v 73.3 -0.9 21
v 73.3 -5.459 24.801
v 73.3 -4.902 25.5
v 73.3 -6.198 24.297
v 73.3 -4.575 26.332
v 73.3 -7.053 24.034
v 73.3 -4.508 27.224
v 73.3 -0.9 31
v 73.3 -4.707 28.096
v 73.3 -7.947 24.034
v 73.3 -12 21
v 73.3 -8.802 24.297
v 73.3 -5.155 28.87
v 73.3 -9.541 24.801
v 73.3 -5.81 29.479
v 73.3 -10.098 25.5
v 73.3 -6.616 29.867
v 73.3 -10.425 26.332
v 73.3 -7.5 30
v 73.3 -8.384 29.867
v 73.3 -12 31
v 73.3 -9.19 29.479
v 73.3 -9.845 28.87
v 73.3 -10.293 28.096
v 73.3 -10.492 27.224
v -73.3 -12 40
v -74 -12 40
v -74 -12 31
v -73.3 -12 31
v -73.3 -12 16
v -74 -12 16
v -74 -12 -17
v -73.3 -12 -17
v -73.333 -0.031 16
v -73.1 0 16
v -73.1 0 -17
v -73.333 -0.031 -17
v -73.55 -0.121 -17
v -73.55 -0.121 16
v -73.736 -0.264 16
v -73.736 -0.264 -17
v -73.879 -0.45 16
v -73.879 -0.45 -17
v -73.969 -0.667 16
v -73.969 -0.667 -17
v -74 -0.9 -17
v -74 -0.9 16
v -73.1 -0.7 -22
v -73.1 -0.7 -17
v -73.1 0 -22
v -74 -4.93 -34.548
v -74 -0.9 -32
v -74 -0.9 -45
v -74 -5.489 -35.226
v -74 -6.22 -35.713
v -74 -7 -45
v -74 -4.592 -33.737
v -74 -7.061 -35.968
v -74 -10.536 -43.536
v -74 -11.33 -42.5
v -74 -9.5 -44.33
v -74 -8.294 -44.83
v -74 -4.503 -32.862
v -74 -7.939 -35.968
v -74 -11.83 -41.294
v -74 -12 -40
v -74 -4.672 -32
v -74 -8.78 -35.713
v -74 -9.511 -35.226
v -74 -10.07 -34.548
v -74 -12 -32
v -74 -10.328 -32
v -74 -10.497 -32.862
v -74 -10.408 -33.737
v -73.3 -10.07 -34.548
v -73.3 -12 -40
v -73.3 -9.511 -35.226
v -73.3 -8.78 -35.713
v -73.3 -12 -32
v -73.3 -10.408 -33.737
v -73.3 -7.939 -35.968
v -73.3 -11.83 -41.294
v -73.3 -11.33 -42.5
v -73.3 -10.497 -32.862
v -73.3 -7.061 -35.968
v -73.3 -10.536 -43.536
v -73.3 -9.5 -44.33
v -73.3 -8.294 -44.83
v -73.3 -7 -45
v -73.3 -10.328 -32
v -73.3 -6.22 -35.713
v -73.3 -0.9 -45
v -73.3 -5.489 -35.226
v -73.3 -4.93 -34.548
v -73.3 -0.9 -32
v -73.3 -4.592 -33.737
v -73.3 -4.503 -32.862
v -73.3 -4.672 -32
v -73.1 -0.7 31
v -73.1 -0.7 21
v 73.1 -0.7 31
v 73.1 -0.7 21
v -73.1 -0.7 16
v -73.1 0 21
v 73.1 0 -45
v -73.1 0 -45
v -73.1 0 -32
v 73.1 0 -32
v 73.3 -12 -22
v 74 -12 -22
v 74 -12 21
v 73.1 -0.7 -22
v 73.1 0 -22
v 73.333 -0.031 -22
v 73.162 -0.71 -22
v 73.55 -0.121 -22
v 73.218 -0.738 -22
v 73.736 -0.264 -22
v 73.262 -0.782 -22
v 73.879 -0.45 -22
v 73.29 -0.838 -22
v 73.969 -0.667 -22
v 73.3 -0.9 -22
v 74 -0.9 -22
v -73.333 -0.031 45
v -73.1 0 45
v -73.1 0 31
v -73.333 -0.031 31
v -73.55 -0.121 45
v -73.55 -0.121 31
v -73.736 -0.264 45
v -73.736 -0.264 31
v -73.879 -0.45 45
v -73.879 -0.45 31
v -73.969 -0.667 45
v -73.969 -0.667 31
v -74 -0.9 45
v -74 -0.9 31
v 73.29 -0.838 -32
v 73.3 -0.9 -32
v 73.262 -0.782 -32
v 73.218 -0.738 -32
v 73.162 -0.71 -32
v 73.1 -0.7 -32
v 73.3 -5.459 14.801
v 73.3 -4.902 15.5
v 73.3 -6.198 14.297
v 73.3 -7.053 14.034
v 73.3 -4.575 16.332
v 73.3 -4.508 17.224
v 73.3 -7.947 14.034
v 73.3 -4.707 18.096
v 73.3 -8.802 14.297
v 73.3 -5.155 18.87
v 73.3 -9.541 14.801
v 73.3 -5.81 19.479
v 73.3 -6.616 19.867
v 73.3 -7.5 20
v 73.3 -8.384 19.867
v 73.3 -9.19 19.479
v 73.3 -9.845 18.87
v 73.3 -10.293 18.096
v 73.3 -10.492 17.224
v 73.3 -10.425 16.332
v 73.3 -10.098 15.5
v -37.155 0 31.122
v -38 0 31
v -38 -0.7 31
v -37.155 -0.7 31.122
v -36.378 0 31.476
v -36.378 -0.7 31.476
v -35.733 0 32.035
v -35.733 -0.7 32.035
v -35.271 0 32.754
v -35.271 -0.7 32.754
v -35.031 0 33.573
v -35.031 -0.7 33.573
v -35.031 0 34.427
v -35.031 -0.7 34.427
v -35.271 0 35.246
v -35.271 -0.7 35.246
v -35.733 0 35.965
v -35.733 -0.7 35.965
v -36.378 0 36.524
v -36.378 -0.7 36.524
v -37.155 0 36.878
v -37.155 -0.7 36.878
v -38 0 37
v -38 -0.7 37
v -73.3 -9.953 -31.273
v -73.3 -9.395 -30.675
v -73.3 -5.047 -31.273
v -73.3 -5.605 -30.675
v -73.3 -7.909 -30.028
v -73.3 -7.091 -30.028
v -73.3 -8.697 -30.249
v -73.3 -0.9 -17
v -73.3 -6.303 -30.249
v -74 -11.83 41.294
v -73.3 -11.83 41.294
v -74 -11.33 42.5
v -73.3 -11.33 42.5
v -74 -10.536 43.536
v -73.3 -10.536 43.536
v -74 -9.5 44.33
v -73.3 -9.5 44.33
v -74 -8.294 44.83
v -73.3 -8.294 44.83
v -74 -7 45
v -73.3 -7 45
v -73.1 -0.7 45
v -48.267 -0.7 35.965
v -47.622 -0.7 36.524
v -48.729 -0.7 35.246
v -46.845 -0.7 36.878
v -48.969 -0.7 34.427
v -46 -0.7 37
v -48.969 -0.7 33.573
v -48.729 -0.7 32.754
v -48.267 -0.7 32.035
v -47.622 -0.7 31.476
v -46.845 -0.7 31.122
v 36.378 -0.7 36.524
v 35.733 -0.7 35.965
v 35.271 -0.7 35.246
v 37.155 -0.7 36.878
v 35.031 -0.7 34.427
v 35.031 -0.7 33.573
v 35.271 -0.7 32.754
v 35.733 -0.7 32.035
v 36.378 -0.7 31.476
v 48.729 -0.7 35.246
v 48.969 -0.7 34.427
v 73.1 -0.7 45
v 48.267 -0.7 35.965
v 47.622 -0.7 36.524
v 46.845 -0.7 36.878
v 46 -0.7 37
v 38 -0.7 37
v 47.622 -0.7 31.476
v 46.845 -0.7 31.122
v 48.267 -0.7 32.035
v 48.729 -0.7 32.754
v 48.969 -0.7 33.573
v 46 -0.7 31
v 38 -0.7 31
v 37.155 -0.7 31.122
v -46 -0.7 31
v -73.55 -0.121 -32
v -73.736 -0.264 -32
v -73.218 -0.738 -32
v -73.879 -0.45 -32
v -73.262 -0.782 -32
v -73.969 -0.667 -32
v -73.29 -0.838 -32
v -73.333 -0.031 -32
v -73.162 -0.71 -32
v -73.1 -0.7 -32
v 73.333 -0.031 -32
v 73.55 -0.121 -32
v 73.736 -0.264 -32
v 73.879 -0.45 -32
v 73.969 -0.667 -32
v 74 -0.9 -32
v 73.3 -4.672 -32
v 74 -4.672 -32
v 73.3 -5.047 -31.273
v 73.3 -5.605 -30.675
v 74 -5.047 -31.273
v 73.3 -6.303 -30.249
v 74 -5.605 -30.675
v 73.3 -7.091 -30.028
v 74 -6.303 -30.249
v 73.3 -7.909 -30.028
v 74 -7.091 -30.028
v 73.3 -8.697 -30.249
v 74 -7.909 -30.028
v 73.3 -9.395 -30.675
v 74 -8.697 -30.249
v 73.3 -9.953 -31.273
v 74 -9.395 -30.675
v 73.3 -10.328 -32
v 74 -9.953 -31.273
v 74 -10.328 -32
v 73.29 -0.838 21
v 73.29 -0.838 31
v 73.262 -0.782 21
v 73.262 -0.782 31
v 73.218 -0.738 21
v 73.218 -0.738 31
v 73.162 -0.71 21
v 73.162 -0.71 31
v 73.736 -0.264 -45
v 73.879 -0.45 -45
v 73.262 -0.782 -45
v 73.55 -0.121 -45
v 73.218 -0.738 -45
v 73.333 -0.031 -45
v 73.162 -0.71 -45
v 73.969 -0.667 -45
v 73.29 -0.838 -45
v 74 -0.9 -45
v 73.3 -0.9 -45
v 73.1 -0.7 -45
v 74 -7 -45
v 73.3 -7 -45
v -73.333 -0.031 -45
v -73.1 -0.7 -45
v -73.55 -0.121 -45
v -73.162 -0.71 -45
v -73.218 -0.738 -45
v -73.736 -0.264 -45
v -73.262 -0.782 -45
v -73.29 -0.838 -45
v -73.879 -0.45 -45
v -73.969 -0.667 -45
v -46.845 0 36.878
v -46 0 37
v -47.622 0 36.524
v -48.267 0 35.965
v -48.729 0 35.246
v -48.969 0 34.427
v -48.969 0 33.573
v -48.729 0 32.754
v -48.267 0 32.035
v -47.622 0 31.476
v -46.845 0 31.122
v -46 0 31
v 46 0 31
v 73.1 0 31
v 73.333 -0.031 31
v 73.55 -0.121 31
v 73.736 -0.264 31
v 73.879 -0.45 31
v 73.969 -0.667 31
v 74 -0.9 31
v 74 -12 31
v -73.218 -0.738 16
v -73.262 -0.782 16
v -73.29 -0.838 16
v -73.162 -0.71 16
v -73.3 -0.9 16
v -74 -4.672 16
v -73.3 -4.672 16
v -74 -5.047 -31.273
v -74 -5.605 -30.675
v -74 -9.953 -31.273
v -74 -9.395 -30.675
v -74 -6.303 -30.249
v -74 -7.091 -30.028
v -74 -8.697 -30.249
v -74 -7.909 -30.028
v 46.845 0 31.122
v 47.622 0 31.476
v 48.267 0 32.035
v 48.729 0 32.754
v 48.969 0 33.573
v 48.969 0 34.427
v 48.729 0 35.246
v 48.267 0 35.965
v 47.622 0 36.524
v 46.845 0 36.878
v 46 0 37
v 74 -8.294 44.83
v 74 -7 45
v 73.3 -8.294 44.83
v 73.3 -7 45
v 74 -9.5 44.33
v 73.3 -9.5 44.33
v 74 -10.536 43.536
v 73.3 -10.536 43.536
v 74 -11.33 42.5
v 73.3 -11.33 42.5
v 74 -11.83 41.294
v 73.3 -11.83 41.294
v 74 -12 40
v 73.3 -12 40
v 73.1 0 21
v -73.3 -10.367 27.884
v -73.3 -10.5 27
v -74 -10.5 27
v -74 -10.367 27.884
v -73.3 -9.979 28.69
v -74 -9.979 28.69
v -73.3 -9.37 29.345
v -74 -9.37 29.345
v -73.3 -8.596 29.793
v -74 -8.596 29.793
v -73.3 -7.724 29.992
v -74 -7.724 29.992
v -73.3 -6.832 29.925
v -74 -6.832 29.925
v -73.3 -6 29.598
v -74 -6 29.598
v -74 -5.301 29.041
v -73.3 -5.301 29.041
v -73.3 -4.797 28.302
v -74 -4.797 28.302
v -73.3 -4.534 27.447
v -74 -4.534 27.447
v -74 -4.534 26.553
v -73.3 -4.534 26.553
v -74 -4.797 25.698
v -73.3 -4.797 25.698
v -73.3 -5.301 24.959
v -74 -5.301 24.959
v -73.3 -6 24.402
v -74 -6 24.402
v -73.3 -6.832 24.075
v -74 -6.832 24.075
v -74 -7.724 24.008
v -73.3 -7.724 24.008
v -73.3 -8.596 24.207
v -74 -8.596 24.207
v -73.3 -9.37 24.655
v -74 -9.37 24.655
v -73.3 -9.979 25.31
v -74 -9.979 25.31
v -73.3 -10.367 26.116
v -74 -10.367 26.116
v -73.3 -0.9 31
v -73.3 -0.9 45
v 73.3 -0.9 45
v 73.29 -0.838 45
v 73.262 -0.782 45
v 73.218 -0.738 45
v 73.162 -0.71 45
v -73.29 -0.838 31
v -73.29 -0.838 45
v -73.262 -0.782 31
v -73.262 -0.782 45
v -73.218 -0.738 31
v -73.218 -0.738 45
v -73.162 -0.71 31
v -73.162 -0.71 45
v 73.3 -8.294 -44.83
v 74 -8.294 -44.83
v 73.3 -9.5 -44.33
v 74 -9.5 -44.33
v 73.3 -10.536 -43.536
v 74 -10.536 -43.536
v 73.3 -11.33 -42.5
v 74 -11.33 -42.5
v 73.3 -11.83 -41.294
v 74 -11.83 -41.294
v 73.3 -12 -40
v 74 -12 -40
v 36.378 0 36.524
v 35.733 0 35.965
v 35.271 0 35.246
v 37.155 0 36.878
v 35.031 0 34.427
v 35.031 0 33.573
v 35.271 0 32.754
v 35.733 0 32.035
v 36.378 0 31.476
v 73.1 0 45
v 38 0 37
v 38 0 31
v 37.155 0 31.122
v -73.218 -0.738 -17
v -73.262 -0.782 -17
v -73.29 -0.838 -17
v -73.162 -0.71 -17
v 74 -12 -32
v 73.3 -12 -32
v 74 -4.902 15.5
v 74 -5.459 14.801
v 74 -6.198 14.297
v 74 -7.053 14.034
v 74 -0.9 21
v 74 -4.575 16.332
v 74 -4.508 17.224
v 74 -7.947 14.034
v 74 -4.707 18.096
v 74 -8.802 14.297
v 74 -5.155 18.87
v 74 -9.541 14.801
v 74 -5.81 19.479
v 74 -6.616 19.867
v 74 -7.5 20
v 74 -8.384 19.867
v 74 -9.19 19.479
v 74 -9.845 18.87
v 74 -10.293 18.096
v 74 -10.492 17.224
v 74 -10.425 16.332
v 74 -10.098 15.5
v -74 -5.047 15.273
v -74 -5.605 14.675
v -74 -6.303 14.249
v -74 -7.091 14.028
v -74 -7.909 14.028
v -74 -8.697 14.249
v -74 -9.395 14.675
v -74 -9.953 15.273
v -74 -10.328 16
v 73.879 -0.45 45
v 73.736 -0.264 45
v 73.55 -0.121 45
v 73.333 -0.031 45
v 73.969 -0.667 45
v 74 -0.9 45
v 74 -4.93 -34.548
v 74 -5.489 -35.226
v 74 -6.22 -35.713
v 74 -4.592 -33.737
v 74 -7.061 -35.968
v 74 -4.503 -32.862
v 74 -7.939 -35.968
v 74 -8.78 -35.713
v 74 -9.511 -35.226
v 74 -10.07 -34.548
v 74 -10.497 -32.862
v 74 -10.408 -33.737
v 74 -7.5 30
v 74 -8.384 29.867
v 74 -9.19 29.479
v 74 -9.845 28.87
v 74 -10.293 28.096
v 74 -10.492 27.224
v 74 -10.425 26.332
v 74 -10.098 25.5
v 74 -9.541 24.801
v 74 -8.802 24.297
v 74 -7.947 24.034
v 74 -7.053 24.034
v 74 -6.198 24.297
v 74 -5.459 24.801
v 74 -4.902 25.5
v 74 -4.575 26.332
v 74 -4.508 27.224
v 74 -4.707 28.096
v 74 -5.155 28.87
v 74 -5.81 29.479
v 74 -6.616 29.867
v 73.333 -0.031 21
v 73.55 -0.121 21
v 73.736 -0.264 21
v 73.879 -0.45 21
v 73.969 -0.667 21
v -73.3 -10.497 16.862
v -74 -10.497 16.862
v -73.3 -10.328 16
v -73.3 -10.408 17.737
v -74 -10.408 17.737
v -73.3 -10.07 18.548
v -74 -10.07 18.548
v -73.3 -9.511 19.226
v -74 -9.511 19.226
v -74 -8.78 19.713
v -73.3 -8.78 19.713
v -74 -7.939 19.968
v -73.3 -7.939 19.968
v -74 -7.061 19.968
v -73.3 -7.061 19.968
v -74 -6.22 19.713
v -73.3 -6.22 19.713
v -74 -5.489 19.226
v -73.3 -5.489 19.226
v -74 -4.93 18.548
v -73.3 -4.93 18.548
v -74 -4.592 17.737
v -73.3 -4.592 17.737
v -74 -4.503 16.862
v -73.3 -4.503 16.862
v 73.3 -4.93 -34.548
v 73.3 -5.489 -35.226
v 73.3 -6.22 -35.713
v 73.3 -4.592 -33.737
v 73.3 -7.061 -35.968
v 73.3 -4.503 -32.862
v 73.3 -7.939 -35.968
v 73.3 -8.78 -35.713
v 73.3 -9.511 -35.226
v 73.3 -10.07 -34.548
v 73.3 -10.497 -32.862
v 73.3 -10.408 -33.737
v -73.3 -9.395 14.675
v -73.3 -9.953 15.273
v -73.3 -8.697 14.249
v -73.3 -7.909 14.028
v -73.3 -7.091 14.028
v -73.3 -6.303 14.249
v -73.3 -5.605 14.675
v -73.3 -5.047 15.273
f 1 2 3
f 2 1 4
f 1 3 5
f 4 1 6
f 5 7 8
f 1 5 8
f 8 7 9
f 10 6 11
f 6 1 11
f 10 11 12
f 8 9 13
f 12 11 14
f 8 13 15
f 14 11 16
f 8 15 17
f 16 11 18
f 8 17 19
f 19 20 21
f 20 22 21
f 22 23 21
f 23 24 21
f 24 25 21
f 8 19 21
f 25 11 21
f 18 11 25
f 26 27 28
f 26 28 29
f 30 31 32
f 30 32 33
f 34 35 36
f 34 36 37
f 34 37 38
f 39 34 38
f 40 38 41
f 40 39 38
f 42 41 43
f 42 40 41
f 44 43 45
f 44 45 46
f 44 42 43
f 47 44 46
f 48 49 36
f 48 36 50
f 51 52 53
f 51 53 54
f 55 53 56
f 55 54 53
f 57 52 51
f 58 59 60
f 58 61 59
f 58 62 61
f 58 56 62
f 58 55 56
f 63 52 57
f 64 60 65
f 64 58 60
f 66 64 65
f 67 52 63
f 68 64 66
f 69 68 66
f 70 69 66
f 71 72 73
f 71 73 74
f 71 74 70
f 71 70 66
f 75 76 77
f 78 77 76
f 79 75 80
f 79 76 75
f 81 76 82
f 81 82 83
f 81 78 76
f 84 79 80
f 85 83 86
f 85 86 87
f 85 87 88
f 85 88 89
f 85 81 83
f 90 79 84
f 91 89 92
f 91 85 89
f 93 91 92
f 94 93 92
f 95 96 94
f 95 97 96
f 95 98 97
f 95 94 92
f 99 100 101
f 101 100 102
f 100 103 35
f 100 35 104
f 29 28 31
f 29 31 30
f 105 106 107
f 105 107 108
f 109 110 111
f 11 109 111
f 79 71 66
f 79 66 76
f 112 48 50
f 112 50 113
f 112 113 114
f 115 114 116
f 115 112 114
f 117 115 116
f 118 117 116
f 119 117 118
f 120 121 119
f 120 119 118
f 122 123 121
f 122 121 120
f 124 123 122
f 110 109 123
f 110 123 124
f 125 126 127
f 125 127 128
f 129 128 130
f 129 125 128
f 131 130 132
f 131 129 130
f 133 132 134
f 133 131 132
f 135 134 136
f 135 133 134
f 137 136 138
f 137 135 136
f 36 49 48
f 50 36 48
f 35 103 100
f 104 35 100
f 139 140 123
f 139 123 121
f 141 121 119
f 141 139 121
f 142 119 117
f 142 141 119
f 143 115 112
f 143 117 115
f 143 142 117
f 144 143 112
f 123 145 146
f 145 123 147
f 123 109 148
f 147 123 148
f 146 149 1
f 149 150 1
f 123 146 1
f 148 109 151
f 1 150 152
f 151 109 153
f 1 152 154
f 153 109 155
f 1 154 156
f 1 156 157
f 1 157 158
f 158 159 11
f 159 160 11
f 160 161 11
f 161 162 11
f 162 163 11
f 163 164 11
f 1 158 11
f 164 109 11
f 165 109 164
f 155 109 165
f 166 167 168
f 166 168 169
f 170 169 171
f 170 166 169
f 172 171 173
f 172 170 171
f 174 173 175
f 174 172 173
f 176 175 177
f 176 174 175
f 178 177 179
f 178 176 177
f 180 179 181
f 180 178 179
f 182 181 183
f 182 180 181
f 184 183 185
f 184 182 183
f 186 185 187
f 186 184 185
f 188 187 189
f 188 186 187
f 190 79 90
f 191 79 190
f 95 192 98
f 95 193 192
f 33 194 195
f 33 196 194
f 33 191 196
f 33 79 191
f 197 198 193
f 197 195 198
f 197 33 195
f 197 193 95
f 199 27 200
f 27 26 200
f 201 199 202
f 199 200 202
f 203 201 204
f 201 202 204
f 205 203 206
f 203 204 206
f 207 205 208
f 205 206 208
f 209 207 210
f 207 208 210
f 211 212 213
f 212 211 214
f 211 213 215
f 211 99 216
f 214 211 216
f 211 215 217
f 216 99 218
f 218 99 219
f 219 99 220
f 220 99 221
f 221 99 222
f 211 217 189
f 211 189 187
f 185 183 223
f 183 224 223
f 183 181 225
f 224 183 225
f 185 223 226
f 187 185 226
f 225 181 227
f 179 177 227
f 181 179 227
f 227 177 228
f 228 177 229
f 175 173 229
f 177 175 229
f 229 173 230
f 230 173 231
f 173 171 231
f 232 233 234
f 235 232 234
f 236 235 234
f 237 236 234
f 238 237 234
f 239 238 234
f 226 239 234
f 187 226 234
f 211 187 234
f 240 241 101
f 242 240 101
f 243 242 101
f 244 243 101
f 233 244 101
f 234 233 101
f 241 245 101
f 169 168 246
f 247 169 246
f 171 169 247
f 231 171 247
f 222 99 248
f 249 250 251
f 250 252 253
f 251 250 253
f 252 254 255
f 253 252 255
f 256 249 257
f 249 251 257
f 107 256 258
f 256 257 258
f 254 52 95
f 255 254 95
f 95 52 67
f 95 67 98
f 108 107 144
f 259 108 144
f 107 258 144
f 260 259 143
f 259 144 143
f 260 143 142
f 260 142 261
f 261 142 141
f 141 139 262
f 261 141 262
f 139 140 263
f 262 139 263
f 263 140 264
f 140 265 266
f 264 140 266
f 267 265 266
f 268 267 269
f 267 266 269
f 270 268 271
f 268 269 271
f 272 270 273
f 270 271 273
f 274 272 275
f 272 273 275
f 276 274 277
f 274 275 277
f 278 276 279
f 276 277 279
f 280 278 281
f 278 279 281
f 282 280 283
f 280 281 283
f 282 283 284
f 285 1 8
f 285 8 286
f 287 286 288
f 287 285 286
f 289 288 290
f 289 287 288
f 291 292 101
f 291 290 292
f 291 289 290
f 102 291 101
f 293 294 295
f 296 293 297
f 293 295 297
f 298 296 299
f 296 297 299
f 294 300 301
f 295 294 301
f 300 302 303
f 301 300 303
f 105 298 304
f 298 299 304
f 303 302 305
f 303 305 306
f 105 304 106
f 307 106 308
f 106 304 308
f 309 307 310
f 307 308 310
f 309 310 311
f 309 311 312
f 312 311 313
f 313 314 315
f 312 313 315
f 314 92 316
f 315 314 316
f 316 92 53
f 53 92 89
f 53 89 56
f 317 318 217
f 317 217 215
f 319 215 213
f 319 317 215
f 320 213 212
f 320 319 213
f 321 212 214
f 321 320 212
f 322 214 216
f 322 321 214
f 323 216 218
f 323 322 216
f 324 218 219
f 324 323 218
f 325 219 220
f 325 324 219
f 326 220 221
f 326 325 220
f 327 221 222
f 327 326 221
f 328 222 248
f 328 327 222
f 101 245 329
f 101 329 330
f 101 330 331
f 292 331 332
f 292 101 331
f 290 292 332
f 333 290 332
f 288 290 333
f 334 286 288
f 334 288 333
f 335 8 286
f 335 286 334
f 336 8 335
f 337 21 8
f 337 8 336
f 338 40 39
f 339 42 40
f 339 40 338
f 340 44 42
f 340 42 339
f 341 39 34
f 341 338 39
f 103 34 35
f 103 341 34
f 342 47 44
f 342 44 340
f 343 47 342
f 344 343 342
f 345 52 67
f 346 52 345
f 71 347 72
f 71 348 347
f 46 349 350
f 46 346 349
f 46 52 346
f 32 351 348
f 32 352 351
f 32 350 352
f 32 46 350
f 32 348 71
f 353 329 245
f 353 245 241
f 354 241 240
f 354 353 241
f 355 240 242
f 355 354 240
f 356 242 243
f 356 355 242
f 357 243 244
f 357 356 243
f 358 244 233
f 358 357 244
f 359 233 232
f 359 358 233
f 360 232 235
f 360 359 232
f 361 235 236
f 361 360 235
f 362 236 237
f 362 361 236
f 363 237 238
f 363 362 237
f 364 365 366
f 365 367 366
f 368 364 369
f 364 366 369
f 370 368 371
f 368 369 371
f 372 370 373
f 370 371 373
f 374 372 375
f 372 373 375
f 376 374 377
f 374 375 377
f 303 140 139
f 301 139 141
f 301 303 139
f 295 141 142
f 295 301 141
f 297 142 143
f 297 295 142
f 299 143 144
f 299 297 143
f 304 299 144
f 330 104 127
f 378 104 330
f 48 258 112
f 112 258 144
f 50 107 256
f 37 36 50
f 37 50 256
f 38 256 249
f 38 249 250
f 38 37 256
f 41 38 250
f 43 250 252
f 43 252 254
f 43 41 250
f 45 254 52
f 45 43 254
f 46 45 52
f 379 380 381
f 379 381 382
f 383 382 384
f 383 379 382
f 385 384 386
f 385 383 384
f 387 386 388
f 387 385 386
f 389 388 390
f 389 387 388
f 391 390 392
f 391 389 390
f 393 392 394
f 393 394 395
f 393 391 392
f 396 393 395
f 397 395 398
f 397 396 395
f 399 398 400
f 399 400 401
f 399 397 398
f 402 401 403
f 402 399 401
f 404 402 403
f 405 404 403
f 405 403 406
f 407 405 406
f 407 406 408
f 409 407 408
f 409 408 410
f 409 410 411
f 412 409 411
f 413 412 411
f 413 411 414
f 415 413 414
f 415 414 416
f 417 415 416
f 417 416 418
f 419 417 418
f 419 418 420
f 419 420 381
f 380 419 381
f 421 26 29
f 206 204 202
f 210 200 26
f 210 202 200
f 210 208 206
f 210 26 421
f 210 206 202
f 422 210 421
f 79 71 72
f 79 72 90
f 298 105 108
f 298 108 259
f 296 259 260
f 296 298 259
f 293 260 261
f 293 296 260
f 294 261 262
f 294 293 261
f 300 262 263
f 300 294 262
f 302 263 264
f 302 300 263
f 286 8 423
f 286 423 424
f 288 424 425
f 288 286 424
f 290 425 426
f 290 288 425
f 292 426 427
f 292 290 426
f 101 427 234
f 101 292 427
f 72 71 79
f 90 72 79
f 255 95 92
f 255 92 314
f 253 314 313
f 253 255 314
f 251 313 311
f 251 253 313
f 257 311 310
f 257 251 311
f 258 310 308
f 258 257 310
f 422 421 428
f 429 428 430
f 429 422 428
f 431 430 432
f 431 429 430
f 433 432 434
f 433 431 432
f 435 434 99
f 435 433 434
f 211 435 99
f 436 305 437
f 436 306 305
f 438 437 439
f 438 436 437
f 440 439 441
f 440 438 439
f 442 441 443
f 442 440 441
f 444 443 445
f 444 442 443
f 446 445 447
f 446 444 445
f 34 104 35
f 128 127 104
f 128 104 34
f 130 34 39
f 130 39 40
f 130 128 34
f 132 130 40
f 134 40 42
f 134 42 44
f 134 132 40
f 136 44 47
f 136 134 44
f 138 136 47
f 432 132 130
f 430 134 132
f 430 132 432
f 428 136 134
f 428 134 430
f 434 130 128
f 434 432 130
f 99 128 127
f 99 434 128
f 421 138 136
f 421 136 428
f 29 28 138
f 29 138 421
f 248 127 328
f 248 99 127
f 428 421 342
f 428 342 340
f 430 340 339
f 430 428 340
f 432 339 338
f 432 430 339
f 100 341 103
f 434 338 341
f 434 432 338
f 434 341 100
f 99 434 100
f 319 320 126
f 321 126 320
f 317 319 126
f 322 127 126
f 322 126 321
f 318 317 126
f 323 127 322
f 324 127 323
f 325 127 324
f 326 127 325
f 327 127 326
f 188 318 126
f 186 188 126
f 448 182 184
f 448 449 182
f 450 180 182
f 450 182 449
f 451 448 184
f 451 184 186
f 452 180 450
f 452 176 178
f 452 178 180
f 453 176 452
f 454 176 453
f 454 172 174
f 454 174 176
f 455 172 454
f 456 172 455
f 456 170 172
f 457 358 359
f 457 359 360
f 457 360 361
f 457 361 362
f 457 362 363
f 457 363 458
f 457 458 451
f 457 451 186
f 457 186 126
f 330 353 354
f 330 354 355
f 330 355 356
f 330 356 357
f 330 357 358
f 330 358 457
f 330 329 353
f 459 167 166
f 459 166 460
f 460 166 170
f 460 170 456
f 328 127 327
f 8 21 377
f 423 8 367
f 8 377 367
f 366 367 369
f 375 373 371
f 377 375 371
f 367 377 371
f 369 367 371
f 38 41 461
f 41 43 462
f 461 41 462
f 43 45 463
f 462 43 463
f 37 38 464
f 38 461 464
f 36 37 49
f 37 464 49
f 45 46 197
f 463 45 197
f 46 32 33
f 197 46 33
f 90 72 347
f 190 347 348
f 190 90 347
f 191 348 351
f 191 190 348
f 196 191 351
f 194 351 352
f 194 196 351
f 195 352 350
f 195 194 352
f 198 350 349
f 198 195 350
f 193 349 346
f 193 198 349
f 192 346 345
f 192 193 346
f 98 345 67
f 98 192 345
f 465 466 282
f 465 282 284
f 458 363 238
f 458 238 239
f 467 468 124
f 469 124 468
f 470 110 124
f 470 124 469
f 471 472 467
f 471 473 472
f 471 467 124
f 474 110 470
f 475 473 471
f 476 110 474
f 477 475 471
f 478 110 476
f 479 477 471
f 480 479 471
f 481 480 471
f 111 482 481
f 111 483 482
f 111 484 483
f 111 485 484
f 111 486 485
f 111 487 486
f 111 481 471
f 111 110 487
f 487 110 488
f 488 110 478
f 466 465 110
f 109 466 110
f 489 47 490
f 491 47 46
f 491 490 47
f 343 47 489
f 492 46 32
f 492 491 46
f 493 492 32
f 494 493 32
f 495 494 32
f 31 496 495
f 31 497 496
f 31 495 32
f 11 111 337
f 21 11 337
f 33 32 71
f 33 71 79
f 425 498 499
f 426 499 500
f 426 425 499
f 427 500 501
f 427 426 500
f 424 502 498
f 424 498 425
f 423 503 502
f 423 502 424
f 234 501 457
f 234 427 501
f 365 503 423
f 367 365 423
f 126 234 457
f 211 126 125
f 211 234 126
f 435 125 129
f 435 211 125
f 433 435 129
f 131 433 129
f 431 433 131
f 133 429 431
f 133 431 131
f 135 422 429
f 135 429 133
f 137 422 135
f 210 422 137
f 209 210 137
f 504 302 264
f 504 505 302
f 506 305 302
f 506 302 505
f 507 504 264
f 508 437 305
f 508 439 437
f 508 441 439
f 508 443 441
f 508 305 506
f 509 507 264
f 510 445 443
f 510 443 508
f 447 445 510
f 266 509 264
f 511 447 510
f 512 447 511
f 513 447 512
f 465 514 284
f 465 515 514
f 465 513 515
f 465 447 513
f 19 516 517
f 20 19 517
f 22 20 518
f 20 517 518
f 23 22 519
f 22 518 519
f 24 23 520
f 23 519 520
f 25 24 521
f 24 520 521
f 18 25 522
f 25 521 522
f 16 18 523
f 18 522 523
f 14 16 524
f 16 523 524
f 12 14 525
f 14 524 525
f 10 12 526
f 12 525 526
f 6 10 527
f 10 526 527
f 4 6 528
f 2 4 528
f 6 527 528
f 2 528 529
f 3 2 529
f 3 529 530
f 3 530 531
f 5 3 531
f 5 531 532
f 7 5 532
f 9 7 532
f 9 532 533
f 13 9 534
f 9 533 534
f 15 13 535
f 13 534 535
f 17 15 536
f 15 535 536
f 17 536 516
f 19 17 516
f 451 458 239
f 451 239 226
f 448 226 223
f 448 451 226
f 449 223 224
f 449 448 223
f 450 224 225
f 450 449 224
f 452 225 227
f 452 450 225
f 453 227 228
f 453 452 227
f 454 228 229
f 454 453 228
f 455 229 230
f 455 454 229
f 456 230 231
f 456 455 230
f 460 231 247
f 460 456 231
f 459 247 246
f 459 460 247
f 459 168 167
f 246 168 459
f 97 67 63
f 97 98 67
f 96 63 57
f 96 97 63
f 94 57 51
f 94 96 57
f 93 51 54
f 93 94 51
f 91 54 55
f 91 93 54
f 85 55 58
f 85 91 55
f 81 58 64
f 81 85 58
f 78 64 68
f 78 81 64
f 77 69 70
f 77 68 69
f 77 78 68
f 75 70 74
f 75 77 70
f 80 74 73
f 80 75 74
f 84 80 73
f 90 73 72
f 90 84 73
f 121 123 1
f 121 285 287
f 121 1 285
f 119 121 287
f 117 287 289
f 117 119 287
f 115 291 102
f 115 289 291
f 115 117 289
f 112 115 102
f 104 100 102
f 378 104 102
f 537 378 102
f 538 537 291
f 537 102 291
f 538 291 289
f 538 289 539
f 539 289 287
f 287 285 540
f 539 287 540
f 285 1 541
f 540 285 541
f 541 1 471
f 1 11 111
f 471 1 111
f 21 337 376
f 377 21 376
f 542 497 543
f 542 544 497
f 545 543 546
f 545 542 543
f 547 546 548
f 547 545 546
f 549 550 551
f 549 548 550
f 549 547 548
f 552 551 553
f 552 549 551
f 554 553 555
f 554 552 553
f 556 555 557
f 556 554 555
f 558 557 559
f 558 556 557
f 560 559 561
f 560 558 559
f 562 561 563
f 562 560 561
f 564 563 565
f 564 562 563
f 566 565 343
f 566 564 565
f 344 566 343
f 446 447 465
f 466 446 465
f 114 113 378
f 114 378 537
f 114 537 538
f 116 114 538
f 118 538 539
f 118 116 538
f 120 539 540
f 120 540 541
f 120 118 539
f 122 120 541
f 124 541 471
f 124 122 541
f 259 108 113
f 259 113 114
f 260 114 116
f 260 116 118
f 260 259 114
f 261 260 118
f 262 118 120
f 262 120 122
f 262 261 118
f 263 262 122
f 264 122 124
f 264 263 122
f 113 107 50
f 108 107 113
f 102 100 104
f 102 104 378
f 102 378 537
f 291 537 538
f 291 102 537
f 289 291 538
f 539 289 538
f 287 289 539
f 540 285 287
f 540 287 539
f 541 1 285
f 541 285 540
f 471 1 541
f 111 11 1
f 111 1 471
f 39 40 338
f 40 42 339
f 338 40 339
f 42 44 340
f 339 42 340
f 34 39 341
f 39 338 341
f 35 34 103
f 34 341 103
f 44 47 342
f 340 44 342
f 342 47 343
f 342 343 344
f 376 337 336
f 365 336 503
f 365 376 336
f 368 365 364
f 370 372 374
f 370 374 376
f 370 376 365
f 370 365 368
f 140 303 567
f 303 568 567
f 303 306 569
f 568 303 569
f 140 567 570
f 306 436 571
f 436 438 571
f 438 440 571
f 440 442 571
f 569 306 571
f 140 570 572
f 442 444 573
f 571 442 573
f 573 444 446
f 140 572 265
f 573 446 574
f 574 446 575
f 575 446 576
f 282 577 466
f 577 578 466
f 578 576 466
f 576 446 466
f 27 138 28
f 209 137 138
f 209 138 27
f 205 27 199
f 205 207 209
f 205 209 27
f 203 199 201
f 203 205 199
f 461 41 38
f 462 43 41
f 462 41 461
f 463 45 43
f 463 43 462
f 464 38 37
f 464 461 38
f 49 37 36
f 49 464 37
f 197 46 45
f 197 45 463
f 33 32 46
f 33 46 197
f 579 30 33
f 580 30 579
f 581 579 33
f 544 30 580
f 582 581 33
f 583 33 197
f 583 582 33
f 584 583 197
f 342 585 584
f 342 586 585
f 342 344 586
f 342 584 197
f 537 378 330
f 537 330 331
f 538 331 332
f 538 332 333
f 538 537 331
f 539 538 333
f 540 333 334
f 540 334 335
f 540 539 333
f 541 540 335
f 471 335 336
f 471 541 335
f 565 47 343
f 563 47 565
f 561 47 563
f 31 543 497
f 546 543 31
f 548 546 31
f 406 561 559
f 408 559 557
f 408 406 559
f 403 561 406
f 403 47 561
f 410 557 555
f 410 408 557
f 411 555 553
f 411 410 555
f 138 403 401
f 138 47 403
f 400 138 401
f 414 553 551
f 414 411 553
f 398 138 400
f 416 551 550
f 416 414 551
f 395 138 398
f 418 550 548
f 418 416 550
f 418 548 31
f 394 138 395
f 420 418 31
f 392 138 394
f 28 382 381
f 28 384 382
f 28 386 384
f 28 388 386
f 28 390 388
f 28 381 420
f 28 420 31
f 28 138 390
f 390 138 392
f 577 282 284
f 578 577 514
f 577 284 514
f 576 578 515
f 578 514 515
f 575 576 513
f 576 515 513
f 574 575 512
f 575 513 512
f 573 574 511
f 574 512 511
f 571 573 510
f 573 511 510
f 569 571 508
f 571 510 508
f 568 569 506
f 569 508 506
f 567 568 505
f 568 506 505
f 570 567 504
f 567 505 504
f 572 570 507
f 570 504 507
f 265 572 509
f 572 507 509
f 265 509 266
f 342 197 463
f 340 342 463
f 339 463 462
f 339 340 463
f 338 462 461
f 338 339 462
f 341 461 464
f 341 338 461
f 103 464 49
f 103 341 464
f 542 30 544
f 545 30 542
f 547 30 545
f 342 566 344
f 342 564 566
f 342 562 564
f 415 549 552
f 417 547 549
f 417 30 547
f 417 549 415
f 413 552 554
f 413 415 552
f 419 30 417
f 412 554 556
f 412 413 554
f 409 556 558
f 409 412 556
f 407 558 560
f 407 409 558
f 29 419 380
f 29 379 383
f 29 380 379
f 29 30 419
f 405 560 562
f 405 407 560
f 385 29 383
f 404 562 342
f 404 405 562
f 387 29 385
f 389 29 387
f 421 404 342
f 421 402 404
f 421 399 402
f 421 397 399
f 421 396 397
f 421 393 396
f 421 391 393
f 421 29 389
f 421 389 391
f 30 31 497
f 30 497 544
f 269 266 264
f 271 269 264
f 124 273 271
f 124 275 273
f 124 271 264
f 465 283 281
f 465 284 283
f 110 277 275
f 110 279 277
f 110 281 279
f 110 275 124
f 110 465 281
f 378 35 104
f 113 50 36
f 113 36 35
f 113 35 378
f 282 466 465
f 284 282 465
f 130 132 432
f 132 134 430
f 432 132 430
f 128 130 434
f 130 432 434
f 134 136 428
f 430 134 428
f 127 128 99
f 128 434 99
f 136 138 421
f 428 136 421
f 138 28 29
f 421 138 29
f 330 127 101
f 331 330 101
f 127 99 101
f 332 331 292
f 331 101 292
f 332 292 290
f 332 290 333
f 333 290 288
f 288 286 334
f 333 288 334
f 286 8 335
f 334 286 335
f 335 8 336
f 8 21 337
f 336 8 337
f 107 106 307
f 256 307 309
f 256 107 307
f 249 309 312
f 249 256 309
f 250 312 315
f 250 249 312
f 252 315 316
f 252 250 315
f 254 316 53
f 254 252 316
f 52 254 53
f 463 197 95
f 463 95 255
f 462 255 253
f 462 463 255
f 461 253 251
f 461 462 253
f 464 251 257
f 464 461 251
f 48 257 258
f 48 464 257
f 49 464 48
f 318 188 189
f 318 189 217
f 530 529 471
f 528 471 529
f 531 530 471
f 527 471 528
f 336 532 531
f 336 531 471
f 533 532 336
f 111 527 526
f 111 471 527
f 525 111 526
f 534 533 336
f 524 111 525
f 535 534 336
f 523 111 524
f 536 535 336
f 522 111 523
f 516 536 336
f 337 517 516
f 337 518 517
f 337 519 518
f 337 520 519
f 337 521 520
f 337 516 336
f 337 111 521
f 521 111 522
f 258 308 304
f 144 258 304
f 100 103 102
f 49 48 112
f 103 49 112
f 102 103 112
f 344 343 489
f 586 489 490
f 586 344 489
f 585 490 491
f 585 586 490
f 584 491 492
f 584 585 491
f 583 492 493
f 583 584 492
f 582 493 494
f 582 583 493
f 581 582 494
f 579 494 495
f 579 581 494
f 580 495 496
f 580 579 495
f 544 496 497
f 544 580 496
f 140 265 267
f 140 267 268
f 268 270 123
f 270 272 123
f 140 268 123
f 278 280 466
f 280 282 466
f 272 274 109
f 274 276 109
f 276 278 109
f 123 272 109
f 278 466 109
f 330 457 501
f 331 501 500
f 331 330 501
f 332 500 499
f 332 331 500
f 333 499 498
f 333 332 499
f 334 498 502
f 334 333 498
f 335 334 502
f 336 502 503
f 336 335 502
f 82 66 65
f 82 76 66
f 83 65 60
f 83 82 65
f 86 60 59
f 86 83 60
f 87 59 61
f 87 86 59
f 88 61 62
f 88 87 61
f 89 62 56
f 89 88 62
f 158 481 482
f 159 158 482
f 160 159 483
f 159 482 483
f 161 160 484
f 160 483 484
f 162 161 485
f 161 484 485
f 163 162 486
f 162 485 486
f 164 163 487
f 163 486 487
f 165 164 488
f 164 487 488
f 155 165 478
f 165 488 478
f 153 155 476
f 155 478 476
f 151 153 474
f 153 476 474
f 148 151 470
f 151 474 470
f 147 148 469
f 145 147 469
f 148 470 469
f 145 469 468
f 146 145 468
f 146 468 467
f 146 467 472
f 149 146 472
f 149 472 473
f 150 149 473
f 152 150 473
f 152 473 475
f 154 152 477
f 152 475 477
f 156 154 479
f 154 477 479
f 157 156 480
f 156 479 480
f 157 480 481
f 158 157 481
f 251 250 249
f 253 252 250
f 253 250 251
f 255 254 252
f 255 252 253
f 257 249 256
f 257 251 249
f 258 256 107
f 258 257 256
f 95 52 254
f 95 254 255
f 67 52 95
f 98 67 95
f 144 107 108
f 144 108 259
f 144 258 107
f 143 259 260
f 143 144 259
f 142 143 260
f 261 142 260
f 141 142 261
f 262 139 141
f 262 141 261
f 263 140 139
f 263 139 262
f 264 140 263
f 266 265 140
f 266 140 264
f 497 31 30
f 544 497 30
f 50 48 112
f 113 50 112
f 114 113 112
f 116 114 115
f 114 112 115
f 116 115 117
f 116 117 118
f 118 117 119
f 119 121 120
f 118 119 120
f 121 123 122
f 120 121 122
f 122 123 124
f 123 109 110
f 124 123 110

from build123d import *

# Parameters (mm, degrees)
SKETCH_1_W                         = 148
SKETCH_1_H                         = 90
SM_BASE_FLANGE_1_DEPTH             = 0.7
SM_EDGE_FLANGE_1_STRIP_W           = 3.2
SM_EDGE_FLANGE_1_STRIP_H           = 0.7
SM_EDGE_FLANGE_1_STRIP_CUT_DEPTH   = 90
SM_EDGE_FLANGE_1_STRIP_2_W         = 3.2
SM_EDGE_FLANGE_1_STRIP_2_H         = 0.7
SM_EDGE_FLANGE_1_STRIP_CUT_2_DEPTH = 90
SM_EDGE_FLANGE_1_DEPTH             = 90
SM_EDGE_FLANGE_1_PROFILE_W         = 90
SM_EDGE_FLANGE_1_PROFILE_H         = 11.1
SM_EDGE_FLANGE_1_PROFILE_R         = 3
SM_EDGE_FLANGE_1_FLAT_DEPTH        = 0.7
SM_EDGE_FLANGE_1_BEND_DEPTH        = 90
FILLET_2_R                         = 5
CUT_EXTRUDE_START                  = -10
SKETCH_15_R                        = 3
CUT_EXTRUDE_1_DEPTH                = 10
SPLIT_BODIES_1_SURFACE_1_1_BACK    = 174.632
SPLIT_BODIES_1_SURFACE_1_1_DEPTH   = 349.264
SPLIT_BODIES_1_SURFACE_1_2_BACK    = 174.632
SPLIT_BODIES_1_SURFACE_1_2_DEPTH   = 349.264
SPLIT_BODIES_1_SURFACE_2_3_BACK    = 174.632
SPLIT_BODIES_1_SURFACE_2_3_DEPTH   = 349.264
SPLIT_BODIES_1_SURFACE_2_4_BACK    = 174.632
SPLIT_BODIES_1_SURFACE_2_4_DEPTH   = 349.264
SPLIT_BODIES_1_SURFACE_3_5_BACK    = 174.632
SPLIT_BODIES_1_SURFACE_3_5_DEPTH   = 349.264
SPLIT_BODIES_1_SURFACE_3_6_BACK    = 174.632
SPLIT_BODIES_1_SURFACE_3_6_DEPTH   = 349.264
SPLIT_BODIES_1_SURFACE_4_7_BACK    = 174.632
SPLIT_BODIES_1_SURFACE_4_7_DEPTH   = 349.264
SPLIT_BODIES_1_SURFACE_4_8_BACK    = 174.632
SPLIT_BODIES_1_SURFACE_4_8_DEPTH   = 349.264


# Sheet-metal steps are written as plain solids
with BuildPart() as part:
    # Sketch 1 → 基体-法兰1 (new body)
    with BuildSketch(Plane(origin=(0, 0, 0), x_dir=(1, 0, 0), z_dir=(0, 1, 0))):
        Rectangle(SKETCH_1_W, SKETCH_1_H)
        with BuildLine():
            Line((-46, -31), (-38, -31))
            ThreePointArc((-38, -31), (-35, -34), (-38, -37))
            Line((-38, -37), (-46, -37))
            ThreePointArc((-46, -37), (-49, -34), (-46, -31))
        make_face(mode=Mode.SUBTRACT)
        with BuildLine():
            Line((38, -31), (46, -31))
            ThreePointArc((46, -31), (49, -34), (46, -37))
            Line((46, -37), (38, -37))
            ThreePointArc((38, -37), (35, -34), (38, -31))
        make_face(mode=Mode.SUBTRACT)
    extrude(amount=-SM_BASE_FLANGE_1_DEPTH)

    # 边线-法兰1 strip (across the edge) → 边线-法兰1 strip cut (cut)
    with BuildSketch(Plane(origin=(74, -0.7, -45), x_dir=(-1, 0, 0), z_dir=(0, 0, 1))):
        with Locations((-0.7, -0.35)):
            Rectangle(SM_EDGE_FLANGE_1_STRIP_W, SM_EDGE_FLANGE_1_STRIP_H)
    extrude(amount=SM_EDGE_FLANGE_1_STRIP_CUT_DEPTH, mode=Mode.SUBTRACT)

    # 边线-法兰1 strip 2 (across the edge) → 边线-法兰1 strip cut 2 (cut)
    with BuildSketch(Plane(origin=(-74, -0.7, 45), x_dir=(1, 0, 0), z_dir=(0, 0, -1))):
        with Locations((-0.7, -0.35)):
            Rectangle(SM_EDGE_FLANGE_1_STRIP_2_W, SM_EDGE_FLANGE_1_STRIP_2_H)
    extrude(amount=SM_EDGE_FLANGE_1_STRIP_CUT_2_DEPTH, mode=Mode.SUBTRACT)

    # 边线-法兰1 bend section (across the edge) → 边线-法兰1 (add)
    with BuildSketch(Plane(origin=(74, -0.7, -45), x_dir=(-1, 0, 0), z_dir=(0, 0, 1))):
        with BuildLine():
            Line((0, 0.2), (0.7, 0.2))
            ThreePointArc((0.7, 0.2), (0.758578644, 0.058578644), (0.9, 0))
            Line((0.9, 0), (0.9, -0.7))
            ThreePointArc((0.9, -0.7), (0.263603897, -0.436396103), (0, 0.2))
        make_face()
    extrude(amount=SM_EDGE_FLANGE_1_DEPTH)

    # 边线-法兰1 profile (on flange) → 边线-法兰1 flat (add)
    with BuildSketch(Plane(origin=(74, -0.7, 0), x_dir=(0, 0, 1), z_dir=(1, 0, 0))):
        with Locations((0, 5.75)):
            Rectangle(SM_EDGE_FLANGE_1_PROFILE_W, SM_EDGE_FLANGE_1_PROFILE_H)
        with Locations((17, 6.8)):
            Circle(SM_EDGE_FLANGE_1_PROFILE_R, mode=Mode.SUBTRACT)
        with Locations((27, 6.8)):
            Circle(SM_EDGE_FLANGE_1_PROFILE_R, mode=Mode.SUBTRACT)
        with Locations((-33, 6.8)):
            Circle(SM_EDGE_FLANGE_1_PROFILE_R, mode=Mode.SUBTRACT)
    extrude(amount=-SM_EDGE_FLANGE_1_FLAT_DEPTH)

    # 边线-法兰1 section (across the edge) → 边线-法兰1 bend (add)
    with BuildSketch(Plane(origin=(-74, -0.7, 45), x_dir=(1, 0, 0), z_dir=(0, 0, -1))):
        with BuildLine():
            Line((0, 0.2), (0, 11.3))
            Line((0, 11.3), (0.7, 11.3))
            Line((0.7, 11.3), (0.7, 0.2))
            ThreePointArc((0.7, 0.2), (0.758578644, 0.058578644), (0.9, 0))
            Line((0.9, 0), (0.9, -0.7))
            ThreePointArc((0.9, -0.7), (0.263603897, -0.436396103), (0, 0.2))
        make_face()
    extrude(amount=SM_EDGE_FLANGE_1_BEND_DEPTH)

    # 圆角2
    fillet_2_edges = [part.edges().sort_by_distance(p)[0] for p in [
        (-73.65, -12, 45),
        (-73.65, -12, -45),
        (73.65, -12, -45),
        (73.65, -12, 45),
    ]]
    fillet(fillet_2_edges, radius=FILLET_2_R)

    # 草图15 → 切除-拉伸1 (cut)
    with BuildSketch(Plane.ZY.offset(74).offset(CUT_EXTRUDE_START)):
        with Locations(Location((-33, -7.5, 0), (0, 0, 270))):
            Circle(SKETCH_15_R)
        with Locations(Location((17, -7.5, 0), (0, 0, 270))):
            Circle(SKETCH_15_R)
        with Locations(Location((27, -7.5, 0), (0, 0, 270))):
            Circle(SKETCH_15_R)
    extrude(amount=CUT_EXTRUDE_1_DEPTH, mode=Mode.SUBTRACT)


with BuildPart() as body_2:
    # Split Bodies 1: the piece behind the surface
    add(part.part)
    # Split Bodies 1 surface 1: a surface, the sketch's curves swept straight by 349.264 mm
    with BuildLine(Plane(origin=(0, 0, 0), x_dir=(1, 0, 0), z_dir=(0, 1, 0)).offset(-SPLIT_BODIES_1_SURFACE_1_1_BACK), mode=Mode.PRIVATE) as split_bodies_1_surface_1_1_path:
        Line((-74, 32), (74, 32))
    split_bodies_1_surface_1_1 = Shell.extrude(split_bodies_1_surface_1_1_path.wire(), (0 * SPLIT_BODIES_1_SURFACE_1_1_DEPTH, 1 * SPLIT_BODIES_1_SURFACE_1_1_DEPTH, 0 * SPLIT_BODIES_1_SURFACE_1_1_DEPTH))
    split(bisect_by=split_bodies_1_surface_1_1, keep=Keep.BOTTOM)


with BuildPart() as part_1:
    add(part.part)

    # Split Bodies 1: split by a surface, the side it looks to stays
    # Split Bodies 1 surface 1: a surface, the sketch's curves swept straight by 349.264 mm
    with BuildLine(Plane(origin=(0, 0, 0), x_dir=(1, 0, 0), z_dir=(0, 1, 0)).offset(-SPLIT_BODIES_1_SURFACE_1_2_BACK), mode=Mode.PRIVATE) as split_bodies_1_surface_1_2_path:
        Line((-74, 32), (74, 32))
    split_bodies_1_surface_1_2 = Shell.extrude(split_bodies_1_surface_1_2_path.wire(), (0 * SPLIT_BODIES_1_SURFACE_1_2_DEPTH, 1 * SPLIT_BODIES_1_SURFACE_1_2_DEPTH, 0 * SPLIT_BODIES_1_SURFACE_1_2_DEPTH))
    split(bisect_by=split_bodies_1_surface_1_2, keep=Keep.TOP)


with BuildPart() as body_3:
    # Split Bodies 1 2 body 2: the piece behind the surface
    add(body_2.part)
    # Split Bodies 1 surface 2: a surface, the sketch's curves swept straight by 349.264 mm
    with BuildLine(Plane(origin=(0, 0, 0), x_dir=(1, 0, 0), z_dir=(0, 1, 0)).offset(-SPLIT_BODIES_1_SURFACE_2_3_BACK), mode=Mode.PRIVATE) as split_bodies_1_surface_2_3_path:
        Line((-74, -31), (74, -31))
    split_bodies_1_surface_2_3 = Shell.extrude(split_bodies_1_surface_2_3_path.wire(), (0 * SPLIT_BODIES_1_SURFACE_2_3_DEPTH, 1 * SPLIT_BODIES_1_SURFACE_2_3_DEPTH, 0 * SPLIT_BODIES_1_SURFACE_2_3_DEPTH))
    split(bisect_by=split_bodies_1_surface_2_3, keep=Keep.BOTTOM)


with BuildPart() as body_2_1:
    add(body_2.part)

    # Split Bodies 1 2 body 2: split by a surface, the side it looks to stays
    # Split Bodies 1 surface 2: a surface, the sketch's curves swept straight by 349.264 mm
    with BuildLine(Plane(origin=(0, 0, 0), x_dir=(1, 0, 0), z_dir=(0, 1, 0)).offset(-SPLIT_BODIES_1_SURFACE_2_4_BACK), mode=Mode.PRIVATE) as split_bodies_1_surface_2_4_path:
        Line((-74, -31), (74, -31))
    split_bodies_1_surface_2_4 = Shell.extrude(split_bodies_1_surface_2_4_path.wire(), (0 * SPLIT_BODIES_1_SURFACE_2_4_DEPTH, 1 * SPLIT_BODIES_1_SURFACE_2_4_DEPTH, 0 * SPLIT_BODIES_1_SURFACE_2_4_DEPTH))
    split(bisect_by=split_bodies_1_surface_2_4, keep=Keep.TOP)


with BuildPart() as body_4:
    # Split Bodies 1 3 body 2: the piece behind the surface
    add(body_2_1.part)
    # Split Bodies 1 surface 3: a surface, the sketch's curves swept straight by 349.264 mm
    with BuildLine(Plane(origin=(0, 0, 0), x_dir=(1, 0, 0), z_dir=(0, 1, 0)).offset(-SPLIT_BODIES_1_SURFACE_3_5_BACK), mode=Mode.PRIVATE) as split_bodies_1_surface_3_5_path:
        Line((-74, -16), (-73.1, -16))
        Line((-73.1, -16), (-73.1, -21))
        Line((-73.1, -21), (74, -21))
    split_bodies_1_surface_3_5 = Shell.extrude(split_bodies_1_surface_3_5_path.wire(), (0 * SPLIT_BODIES_1_SURFACE_3_5_DEPTH, 1 * SPLIT_BODIES_1_SURFACE_3_5_DEPTH, 0 * SPLIT_BODIES_1_SURFACE_3_5_DEPTH))
    split(bisect_by=split_bodies_1_surface_3_5, keep=Keep.BOTTOM)


with BuildPart() as body_2_2:
    add(body_2_1.part)

    # Split Bodies 1 3 body 2: split by a surface, the side it looks to stays
    # Split Bodies 1 surface 3: a surface, the sketch's curves swept straight by 349.264 mm
    with BuildLine(Plane(origin=(0, 0, 0), x_dir=(1, 0, 0), z_dir=(0, 1, 0)).offset(-SPLIT_BODIES_1_SURFACE_3_6_BACK), mode=Mode.PRIVATE) as split_bodies_1_surface_3_6_path:
        Line((-74, -16), (-73.1, -16))
        Line((-73.1, -16), (-73.1, -21))
        Line((-73.1, -21), (74, -21))
    split_bodies_1_surface_3_6 = Shell.extrude(split_bodies_1_surface_3_6_path.wire(), (0 * SPLIT_BODIES_1_SURFACE_3_6_DEPTH, 1 * SPLIT_BODIES_1_SURFACE_3_6_DEPTH, 0 * SPLIT_BODIES_1_SURFACE_3_6_DEPTH))
    split(bisect_by=split_bodies_1_surface_3_6, keep=Keep.TOP)


with BuildPart() as body_5_2:
    # Split Bodies 1 4 body 2: the piece behind the surface
    add(body_2_2.part)
    # Split Bodies 1 surface 4: a surface, the sketch's curves swept straight by 349.264 mm
    with BuildLine(Plane(origin=(0, 0, 0), x_dir=(1, 0, 0), z_dir=(0, 1, 0)).offset(-SPLIT_BODIES_1_SURFACE_4_7_BACK), mode=Mode.PRIVATE) as split_bodies_1_surface_4_7_path:
        Line((-74, 17), (-73.1, 17))
        Line((-73.1, 17), (-73.1, 22))
        Line((-73.1, 22), (74, 22))
    split_bodies_1_surface_4_7 = Shell.extrude(split_bodies_1_surface_4_7_path.wire(), (0 * SPLIT_BODIES_1_SURFACE_4_7_DEPTH, 1 * SPLIT_BODIES_1_SURFACE_4_7_DEPTH, 0 * SPLIT_BODIES_1_SURFACE_4_7_DEPTH))
    split(bisect_by=split_bodies_1_surface_4_7, keep=Keep.BOTTOM)


with BuildPart() as body_2_3:
    add(body_2_2.part)

    # Split Bodies 1 4 body 2: split by a surface, the side it looks to stays
    # Split Bodies 1 surface 4: a surface, the sketch's curves swept straight by 349.264 mm
    with BuildLine(Plane(origin=(0, 0, 0), x_dir=(1, 0, 0), z_dir=(0, 1, 0)).offset(-SPLIT_BODIES_1_SURFACE_4_8_BACK), mode=Mode.PRIVATE) as split_bodies_1_surface_4_8_path:
        Line((-74, 17), (-73.1, 17))
        Line((-73.1, 17), (-73.1, 22))
        Line((-73.1, 22), (74, 22))
    split_bodies_1_surface_4_8 = Shell.extrude(split_bodies_1_surface_4_8_path.wire(), (0 * SPLIT_BODIES_1_SURFACE_4_8_DEPTH, 1 * SPLIT_BODIES_1_SURFACE_4_8_DEPTH, 0 * SPLIT_BODIES_1_SURFACE_4_8_DEPTH))
    split(bisect_by=split_bodies_1_surface_4_8, keep=Keep.TOP)


solid = Compound([part_1.part, body_3.part, body_4.part, body_5_2.part, body_2_3.part])
